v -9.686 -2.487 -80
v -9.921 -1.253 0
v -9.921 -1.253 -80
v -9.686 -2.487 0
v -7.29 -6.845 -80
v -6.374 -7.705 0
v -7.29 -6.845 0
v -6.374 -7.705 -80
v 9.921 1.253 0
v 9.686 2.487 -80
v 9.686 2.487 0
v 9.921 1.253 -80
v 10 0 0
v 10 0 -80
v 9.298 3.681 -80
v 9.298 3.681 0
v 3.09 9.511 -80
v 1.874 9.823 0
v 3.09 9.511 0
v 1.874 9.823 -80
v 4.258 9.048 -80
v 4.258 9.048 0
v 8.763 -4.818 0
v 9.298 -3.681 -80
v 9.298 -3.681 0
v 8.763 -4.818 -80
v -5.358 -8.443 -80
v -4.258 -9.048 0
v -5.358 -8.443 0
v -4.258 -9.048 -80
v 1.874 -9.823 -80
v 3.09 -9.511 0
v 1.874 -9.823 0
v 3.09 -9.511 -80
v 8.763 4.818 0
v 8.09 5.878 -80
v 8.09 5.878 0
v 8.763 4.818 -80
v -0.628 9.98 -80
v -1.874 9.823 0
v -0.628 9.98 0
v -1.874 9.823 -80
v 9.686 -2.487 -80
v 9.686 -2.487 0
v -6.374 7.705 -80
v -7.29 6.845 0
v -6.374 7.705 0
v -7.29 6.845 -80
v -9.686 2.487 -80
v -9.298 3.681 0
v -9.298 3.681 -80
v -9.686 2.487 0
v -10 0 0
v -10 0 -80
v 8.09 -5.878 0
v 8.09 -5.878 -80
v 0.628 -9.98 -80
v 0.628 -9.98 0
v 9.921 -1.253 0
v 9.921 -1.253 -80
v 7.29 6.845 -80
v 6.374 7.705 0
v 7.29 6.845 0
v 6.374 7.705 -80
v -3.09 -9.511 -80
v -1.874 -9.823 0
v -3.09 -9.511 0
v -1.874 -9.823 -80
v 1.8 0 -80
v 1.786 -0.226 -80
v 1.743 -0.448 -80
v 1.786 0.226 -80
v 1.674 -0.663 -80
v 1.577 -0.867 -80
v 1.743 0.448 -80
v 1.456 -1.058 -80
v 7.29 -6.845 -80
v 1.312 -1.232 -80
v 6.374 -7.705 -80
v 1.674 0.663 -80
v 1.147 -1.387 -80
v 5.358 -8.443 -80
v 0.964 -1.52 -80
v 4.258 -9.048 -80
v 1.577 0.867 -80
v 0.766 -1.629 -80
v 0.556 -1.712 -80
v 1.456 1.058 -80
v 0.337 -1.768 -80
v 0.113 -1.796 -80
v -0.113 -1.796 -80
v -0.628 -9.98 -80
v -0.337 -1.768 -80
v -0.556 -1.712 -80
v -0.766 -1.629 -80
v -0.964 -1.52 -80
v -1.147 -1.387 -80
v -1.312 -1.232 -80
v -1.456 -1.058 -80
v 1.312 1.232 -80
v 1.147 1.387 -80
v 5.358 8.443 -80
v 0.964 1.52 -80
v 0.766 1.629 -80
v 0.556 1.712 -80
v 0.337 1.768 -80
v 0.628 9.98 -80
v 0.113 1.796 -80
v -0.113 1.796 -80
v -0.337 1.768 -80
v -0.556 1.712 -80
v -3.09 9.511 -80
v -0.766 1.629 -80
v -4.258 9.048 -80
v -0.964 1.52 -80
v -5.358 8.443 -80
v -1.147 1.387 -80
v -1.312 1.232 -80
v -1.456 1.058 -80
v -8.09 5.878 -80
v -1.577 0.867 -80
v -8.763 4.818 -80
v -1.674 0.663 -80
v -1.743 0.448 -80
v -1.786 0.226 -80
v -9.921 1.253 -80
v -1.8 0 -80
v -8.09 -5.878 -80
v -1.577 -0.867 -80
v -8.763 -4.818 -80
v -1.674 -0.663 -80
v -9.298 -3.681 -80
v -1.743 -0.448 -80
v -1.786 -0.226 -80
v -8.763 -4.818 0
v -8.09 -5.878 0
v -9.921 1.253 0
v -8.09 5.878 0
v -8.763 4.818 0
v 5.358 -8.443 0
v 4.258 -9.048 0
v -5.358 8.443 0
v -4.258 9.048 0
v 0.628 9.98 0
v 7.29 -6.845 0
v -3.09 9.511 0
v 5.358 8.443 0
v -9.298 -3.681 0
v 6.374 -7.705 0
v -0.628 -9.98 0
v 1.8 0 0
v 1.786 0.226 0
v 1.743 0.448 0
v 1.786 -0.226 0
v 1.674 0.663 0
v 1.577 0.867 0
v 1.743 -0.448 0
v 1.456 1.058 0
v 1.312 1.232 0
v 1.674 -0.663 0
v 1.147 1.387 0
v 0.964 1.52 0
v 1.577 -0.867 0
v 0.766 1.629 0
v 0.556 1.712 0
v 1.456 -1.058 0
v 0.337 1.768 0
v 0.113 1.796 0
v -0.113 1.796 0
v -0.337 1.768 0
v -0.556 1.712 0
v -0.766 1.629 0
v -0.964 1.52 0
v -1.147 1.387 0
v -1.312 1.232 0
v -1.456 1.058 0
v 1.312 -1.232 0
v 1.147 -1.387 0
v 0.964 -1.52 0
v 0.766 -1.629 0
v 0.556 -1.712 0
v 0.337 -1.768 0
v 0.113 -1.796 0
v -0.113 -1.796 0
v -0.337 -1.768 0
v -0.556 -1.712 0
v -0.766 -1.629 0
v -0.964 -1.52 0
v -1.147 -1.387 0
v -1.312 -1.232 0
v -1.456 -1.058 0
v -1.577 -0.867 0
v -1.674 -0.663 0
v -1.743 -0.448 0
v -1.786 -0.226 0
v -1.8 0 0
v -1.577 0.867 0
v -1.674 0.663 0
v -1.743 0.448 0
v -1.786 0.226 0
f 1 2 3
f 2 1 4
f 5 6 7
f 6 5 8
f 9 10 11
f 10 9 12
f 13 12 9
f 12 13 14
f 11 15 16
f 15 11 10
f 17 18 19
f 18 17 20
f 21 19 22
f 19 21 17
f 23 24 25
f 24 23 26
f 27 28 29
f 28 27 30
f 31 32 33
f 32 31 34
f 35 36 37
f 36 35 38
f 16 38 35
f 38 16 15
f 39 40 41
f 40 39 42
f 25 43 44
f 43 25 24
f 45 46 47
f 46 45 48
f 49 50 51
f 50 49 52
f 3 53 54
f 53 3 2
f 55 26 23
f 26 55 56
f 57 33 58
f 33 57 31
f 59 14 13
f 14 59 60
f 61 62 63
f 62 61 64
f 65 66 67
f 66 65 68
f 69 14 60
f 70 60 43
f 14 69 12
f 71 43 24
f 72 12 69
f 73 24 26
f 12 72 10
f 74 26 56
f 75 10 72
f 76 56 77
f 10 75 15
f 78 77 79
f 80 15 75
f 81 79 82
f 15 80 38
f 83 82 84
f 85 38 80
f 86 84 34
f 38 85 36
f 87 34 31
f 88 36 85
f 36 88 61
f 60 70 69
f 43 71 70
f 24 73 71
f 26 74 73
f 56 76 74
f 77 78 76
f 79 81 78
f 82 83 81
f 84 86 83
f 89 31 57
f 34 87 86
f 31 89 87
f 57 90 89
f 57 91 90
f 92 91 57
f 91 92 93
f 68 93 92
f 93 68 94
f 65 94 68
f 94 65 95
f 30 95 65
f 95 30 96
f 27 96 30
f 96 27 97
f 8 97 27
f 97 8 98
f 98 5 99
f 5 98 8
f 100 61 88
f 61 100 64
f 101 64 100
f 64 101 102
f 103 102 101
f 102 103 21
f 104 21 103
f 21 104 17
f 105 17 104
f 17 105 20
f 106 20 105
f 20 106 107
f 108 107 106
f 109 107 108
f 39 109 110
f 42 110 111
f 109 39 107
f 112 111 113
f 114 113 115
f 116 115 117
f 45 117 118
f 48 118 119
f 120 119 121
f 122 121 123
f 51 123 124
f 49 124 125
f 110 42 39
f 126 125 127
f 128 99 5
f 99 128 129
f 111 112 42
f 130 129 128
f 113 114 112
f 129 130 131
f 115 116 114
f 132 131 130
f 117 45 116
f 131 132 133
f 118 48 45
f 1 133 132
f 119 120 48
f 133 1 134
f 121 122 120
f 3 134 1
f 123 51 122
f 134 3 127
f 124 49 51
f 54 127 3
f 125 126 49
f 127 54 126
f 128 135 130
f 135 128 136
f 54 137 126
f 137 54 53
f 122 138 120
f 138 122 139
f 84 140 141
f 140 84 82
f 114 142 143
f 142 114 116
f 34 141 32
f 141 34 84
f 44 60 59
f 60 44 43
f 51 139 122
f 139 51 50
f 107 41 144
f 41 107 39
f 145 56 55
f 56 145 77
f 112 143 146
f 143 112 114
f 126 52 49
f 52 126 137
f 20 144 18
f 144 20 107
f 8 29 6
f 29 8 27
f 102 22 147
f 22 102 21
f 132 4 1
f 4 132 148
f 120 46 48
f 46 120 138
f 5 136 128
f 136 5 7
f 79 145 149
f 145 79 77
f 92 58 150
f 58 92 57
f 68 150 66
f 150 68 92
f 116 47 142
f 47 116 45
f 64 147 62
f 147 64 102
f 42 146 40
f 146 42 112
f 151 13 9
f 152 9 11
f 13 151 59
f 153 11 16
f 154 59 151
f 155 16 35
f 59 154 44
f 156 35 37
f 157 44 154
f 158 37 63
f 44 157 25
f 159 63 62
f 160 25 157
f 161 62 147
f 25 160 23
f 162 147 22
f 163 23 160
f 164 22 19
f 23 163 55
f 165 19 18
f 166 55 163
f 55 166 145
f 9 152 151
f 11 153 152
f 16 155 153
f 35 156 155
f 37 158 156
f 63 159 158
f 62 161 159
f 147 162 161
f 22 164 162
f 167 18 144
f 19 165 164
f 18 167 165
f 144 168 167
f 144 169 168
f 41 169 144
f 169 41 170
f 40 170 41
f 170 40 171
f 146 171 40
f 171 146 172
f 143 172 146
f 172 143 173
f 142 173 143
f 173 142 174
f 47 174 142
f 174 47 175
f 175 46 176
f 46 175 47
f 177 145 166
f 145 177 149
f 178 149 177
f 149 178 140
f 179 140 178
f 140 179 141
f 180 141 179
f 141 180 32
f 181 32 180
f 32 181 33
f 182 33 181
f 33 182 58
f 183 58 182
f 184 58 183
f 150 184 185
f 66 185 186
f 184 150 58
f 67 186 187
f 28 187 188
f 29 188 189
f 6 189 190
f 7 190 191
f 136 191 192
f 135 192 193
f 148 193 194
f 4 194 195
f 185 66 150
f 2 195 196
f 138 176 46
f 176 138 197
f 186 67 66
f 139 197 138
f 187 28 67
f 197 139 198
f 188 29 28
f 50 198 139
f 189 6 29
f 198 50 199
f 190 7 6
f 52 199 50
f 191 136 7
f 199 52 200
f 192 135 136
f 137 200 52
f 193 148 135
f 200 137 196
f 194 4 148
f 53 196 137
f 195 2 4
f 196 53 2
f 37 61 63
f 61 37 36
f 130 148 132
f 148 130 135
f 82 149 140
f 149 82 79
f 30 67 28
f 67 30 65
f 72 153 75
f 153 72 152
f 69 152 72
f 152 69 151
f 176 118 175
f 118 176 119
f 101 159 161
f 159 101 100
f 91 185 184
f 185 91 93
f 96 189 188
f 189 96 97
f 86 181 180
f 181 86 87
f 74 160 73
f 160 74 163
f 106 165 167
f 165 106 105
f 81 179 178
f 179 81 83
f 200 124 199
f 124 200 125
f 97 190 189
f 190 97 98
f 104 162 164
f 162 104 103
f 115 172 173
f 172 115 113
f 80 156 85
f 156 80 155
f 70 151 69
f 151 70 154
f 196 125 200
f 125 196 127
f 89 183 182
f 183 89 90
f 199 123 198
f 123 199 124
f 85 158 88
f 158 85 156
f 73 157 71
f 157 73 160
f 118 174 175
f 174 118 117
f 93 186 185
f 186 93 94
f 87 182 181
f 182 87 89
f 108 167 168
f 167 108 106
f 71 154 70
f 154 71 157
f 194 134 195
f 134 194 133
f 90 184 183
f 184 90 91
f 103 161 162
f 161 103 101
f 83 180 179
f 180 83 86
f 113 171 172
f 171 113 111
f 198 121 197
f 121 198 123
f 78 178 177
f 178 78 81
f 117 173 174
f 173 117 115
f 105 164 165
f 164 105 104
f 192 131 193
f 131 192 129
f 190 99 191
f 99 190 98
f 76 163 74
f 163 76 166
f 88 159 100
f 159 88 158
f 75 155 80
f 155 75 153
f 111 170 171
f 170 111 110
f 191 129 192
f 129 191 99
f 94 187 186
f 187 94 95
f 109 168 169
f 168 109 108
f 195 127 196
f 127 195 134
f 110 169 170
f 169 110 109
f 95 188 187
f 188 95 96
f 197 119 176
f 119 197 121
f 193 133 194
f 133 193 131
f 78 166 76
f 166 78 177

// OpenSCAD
$fn = 50;


difference() {
	union() {
		translate(v = [0, 0, -80.0000000000]) {
			cylinder(h = 80, r = 10.0000000000);
		}
		cylinder(h = 0, r = 19.0000000000);
	}
	union() {
		#translate(v = [0, 0, -80]) {
			cylinder(h = 80, r = 1.8000000000);
		}
	}
}
